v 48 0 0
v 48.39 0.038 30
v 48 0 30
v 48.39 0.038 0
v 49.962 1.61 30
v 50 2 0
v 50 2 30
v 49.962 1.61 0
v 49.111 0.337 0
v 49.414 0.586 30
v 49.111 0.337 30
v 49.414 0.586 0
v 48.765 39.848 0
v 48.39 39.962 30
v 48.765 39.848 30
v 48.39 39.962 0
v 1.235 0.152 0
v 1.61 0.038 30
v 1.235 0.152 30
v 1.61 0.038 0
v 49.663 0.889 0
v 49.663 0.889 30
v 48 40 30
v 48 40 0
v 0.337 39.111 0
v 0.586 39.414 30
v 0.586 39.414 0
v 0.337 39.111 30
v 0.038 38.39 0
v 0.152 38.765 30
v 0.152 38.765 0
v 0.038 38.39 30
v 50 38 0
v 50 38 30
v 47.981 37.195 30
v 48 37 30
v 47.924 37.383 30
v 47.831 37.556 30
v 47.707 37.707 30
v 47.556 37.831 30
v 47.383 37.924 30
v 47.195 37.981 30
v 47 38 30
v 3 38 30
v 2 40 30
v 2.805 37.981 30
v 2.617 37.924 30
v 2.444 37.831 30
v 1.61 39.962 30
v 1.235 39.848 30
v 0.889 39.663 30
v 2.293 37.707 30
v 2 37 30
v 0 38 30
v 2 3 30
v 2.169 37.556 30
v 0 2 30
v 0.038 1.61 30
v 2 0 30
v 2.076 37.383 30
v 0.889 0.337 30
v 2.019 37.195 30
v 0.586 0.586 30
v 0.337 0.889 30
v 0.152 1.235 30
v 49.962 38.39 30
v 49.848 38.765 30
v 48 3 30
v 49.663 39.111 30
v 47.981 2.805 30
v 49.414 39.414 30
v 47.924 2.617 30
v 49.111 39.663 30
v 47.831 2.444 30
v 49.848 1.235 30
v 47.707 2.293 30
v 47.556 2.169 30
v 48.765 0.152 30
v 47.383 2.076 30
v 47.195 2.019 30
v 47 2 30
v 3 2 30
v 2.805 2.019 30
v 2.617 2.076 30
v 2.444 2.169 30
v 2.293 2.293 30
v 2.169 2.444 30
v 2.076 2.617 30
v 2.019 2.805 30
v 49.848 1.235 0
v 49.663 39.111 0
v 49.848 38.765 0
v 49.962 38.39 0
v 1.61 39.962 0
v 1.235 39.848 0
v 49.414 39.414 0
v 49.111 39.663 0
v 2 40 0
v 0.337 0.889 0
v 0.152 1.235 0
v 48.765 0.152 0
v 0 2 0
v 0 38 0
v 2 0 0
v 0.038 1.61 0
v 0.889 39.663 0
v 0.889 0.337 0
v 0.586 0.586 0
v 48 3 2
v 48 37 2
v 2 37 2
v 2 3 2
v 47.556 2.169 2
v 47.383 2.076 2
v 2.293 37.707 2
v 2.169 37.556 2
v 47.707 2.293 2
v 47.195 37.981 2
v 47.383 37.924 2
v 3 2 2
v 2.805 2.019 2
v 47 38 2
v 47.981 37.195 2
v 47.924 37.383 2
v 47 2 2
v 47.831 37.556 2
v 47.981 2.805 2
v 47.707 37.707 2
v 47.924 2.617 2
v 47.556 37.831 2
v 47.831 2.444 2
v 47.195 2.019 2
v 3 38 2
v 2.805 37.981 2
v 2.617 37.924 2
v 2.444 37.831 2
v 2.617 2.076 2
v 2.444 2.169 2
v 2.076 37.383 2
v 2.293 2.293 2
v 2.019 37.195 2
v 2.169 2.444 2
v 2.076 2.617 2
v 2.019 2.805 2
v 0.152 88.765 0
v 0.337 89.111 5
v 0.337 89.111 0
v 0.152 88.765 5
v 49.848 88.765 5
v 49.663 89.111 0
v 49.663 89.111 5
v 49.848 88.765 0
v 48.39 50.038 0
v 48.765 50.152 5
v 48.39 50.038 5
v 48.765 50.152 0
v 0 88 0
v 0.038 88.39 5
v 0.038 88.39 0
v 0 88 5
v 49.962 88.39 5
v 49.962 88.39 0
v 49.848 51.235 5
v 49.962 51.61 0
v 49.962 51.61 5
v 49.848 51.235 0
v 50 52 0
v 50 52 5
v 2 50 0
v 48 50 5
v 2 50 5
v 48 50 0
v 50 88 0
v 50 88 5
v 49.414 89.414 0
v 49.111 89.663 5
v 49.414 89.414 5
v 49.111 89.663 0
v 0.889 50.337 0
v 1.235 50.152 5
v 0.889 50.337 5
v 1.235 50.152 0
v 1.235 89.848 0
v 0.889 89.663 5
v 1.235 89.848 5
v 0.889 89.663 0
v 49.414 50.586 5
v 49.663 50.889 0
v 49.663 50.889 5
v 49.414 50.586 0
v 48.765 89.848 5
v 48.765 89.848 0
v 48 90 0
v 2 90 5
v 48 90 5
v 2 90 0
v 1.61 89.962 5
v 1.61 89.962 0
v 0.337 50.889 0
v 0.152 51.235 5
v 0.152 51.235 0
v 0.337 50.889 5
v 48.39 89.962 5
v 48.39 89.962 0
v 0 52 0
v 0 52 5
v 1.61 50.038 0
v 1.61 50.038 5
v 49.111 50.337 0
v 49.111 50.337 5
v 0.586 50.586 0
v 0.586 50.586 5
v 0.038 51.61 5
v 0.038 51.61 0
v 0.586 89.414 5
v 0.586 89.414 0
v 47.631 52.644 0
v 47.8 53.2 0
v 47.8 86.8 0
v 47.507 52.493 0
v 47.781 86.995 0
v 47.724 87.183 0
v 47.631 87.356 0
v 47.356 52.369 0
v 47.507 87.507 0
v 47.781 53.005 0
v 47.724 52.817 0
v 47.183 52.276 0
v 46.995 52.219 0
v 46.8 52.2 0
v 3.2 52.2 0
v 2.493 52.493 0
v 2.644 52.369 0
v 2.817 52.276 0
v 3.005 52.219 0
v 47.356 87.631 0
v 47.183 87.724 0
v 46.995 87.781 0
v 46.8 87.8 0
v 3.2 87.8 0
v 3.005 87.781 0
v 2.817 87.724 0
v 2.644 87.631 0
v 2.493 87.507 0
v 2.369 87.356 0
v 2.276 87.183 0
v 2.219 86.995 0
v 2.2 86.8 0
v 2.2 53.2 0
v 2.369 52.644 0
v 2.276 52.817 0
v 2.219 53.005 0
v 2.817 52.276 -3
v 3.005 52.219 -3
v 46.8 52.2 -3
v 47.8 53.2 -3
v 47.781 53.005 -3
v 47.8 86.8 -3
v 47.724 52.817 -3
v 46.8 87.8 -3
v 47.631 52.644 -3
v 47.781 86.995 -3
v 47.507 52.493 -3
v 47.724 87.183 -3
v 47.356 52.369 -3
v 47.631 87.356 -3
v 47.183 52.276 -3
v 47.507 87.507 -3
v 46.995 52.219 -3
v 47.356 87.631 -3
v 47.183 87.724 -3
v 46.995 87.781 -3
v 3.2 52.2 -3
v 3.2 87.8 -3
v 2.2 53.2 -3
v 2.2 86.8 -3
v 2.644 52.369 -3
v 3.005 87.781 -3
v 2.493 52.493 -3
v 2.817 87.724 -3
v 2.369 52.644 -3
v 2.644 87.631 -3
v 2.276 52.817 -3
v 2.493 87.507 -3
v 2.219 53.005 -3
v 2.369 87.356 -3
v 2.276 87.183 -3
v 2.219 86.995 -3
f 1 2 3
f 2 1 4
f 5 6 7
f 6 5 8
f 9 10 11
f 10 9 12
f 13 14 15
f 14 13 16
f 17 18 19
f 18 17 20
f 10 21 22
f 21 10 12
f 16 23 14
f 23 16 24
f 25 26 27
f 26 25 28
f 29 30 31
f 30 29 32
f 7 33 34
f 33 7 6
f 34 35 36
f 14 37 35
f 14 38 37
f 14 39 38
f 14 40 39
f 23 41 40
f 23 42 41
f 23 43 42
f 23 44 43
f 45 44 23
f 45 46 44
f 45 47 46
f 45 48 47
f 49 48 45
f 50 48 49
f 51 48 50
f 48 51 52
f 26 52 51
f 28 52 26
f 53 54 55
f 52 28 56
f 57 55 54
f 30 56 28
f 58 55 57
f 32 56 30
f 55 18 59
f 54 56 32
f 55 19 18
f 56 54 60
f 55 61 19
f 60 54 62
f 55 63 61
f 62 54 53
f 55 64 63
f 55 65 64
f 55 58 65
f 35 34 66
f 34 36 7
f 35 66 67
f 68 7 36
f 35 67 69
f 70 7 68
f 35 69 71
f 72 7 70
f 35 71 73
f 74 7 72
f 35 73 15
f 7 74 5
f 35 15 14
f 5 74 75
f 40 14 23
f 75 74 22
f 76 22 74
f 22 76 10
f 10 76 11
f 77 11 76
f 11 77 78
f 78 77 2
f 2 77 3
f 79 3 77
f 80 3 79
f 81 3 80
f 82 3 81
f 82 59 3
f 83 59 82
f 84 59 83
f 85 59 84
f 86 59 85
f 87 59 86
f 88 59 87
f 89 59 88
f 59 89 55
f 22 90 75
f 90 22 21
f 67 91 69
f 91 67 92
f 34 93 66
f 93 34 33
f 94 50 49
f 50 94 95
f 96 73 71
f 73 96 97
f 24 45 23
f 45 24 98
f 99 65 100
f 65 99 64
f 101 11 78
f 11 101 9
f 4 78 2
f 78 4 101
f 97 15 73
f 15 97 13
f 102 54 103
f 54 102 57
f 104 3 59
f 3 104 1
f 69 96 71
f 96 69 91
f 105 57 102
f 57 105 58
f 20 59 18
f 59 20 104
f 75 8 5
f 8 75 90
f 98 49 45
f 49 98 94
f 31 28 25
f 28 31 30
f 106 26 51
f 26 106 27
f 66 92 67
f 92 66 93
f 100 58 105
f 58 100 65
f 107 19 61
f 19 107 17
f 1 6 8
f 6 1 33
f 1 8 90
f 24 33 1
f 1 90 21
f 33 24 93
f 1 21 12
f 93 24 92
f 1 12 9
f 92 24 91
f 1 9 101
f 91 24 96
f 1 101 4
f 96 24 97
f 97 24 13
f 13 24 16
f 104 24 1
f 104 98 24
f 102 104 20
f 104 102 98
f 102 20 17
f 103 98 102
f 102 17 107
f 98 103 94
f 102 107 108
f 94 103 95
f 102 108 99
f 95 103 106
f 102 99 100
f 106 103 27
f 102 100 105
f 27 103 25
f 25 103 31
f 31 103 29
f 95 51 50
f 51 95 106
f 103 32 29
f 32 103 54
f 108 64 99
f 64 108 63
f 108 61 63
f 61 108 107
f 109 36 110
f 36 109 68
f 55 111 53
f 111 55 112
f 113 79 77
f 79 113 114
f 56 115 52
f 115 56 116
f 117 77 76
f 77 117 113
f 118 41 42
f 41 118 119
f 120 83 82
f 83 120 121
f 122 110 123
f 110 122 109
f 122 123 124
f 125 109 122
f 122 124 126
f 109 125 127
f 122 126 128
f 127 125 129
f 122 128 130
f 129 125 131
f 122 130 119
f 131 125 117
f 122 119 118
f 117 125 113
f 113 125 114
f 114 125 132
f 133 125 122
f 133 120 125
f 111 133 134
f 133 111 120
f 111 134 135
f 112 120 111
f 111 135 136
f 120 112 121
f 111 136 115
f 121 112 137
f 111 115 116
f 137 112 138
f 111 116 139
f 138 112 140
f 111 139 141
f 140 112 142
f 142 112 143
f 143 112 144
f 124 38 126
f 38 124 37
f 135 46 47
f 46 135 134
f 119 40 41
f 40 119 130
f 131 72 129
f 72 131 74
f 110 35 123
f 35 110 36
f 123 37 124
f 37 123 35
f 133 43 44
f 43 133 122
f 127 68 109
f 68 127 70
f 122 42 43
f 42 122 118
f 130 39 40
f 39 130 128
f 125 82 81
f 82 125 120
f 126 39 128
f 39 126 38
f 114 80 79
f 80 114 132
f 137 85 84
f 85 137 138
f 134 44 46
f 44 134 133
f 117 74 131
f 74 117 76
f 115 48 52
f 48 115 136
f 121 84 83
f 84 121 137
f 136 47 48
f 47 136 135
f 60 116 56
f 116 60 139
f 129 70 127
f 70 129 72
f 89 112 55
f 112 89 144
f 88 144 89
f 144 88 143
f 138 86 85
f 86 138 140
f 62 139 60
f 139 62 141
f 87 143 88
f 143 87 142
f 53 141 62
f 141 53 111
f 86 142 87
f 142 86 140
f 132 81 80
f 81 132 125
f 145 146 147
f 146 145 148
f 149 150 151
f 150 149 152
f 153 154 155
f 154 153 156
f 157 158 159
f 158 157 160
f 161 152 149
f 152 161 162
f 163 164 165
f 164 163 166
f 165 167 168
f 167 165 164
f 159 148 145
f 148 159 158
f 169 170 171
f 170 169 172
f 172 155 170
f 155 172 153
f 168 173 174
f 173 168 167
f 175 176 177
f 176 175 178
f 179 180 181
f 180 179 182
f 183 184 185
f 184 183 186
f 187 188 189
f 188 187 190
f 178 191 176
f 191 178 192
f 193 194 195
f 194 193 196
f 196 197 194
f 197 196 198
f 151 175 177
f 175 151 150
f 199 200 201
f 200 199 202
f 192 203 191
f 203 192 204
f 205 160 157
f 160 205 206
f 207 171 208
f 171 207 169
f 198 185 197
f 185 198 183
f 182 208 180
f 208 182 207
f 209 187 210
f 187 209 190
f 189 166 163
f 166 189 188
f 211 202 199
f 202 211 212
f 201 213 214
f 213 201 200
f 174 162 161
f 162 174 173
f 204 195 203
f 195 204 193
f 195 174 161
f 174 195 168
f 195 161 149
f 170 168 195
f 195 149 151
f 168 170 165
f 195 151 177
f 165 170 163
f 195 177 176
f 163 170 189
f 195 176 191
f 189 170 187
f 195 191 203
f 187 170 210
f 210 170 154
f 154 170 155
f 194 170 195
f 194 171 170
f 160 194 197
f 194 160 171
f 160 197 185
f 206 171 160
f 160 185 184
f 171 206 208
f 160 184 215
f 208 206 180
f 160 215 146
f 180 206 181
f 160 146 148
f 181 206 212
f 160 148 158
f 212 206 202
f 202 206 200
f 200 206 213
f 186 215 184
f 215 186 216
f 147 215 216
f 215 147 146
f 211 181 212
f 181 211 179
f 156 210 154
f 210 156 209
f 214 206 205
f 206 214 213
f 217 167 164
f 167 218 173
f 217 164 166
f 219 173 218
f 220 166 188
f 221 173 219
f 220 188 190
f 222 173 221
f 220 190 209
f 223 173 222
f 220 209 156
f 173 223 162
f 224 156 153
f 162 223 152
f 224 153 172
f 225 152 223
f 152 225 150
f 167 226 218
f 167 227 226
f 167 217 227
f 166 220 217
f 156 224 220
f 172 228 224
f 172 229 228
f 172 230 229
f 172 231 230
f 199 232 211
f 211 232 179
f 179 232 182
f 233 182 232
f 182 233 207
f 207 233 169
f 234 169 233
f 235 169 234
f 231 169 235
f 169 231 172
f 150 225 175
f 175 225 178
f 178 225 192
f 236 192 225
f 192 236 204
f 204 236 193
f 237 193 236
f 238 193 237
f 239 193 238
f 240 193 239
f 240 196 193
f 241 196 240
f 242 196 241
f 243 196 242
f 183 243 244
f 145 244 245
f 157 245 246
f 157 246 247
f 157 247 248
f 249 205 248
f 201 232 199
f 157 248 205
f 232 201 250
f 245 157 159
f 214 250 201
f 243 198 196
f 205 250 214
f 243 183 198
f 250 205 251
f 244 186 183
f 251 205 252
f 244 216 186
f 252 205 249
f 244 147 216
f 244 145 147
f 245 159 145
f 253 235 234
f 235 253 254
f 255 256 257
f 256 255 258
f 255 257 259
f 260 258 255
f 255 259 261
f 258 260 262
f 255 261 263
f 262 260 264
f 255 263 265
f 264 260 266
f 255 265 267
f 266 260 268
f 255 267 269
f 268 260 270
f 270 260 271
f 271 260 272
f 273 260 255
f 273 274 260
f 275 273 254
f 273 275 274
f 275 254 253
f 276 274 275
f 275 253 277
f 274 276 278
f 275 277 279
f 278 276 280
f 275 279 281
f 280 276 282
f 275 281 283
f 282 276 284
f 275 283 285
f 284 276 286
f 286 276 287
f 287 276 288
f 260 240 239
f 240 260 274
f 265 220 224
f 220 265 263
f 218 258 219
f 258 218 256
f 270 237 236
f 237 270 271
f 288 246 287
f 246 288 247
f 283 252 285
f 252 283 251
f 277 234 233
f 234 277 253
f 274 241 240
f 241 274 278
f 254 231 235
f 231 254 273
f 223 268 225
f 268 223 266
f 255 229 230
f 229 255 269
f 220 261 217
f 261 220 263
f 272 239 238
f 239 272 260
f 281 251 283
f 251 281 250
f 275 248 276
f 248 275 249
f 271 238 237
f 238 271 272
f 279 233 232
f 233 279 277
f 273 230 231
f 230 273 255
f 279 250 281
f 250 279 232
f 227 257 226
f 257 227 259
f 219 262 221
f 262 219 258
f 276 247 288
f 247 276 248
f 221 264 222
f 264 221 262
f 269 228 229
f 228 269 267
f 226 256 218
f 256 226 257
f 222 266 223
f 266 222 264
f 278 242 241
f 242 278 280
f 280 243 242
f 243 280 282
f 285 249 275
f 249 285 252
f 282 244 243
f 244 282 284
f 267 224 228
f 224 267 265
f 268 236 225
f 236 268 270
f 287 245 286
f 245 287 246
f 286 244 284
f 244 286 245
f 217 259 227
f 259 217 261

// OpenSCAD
// file: modules/lid.scad
// Lid module for the multi-file box example

include <../utils/helpers.scad>

/**
 * Create a lid for the box
 * @param width - Box width
 * @param depth - Box depth
 * @param wall_thickness - Wall thickness
 */
module box_lid(width, depth, wall_thickness) {
    lid_height = 5;
    lip_height = 3;
    clearance = 0.2;
    
    union() {
        // Lid top
        rounded_cube([width, depth, lid_height], 2);
        
        // Lip that fits inside the box
        translate([wall_thickness + clearance, wall_thickness + clearance, -lip_height])
            rounded_cube([
                width - 2 * (wall_thickness + clearance),
                depth - 2 * (wall_thickness + clearance),
                lip_height
            ], 1);
    }
}
// file: utils/helpers.scad
// Helper functions for the multi-file box example

/**
 * Create a cube with rounded edges
 * @param size - [width, depth, height] or single value
 * @param radius - Corner radius
 */
module rounded_cube(size, radius) {
    w = is_list(size) ? size[0] : size;
    d = is_list(size) ? size[1] : size;
    h = is_list(size) ? size[2] : size;
    
    hull() {
        translate([radius, radius, 0])
            cylinder(r=radius, h=h);
        translate([w-radius, radius, 0])
            cylinder(r=radius, h=h);
        translate([radius, d-radius, 0])
            cylinder(r=radius, h=h);
        translate([w-radius, d-radius, 0])
            cylinder(r=radius, h=h);
    }
}

/**
 * Create a chamfered edge
 * @param length - Length of the edge
 * @param size - Size of the chamfer
 */
module chamfer(length, size) {
    rotate([0, 90, 0])
        linear_extrude(height=length)
            polygon([[0, 0], [size, 0], [0, size]]);
}
// main file
/*[Dimensions]*/
// Box width in mm
width = 50; // [20:100]

// Box height in mm
height = 30; // [10:80]

// Box depth in mm
depth = 40; // [20:100]

/*[Features]*/
// Include a lid
include_lid = "yes"; // [yes, no]

// Wall thickness in mm
wall_thickness = 2; // [1:0.5:5]

/*[Advanced]*/
// Render quality
$fn = 32; // [8:64]

// Include helper functions
include <utils/helpers.scad>

// Include lid module
use <modules/lid.scad>

// Main box body
module box_body() {
    difference() {
        // Outer shell
        rounded_cube([width, depth, height], 2);
        
        // Inner cavity
        translate([wall_thickness, wall_thickness, wall_thickness])
            rounded_cube([
                width - 2 * wall_thickness,
                depth - 2 * wall_thickness,
                height
            ], 1);
    }
}

// Render the box
box_body();

// Optionally render the lid
if (include_lid == "yes") {
    translate([0, depth + 10, 0])
        box_lid(width, depth, wall_thickness);
}
